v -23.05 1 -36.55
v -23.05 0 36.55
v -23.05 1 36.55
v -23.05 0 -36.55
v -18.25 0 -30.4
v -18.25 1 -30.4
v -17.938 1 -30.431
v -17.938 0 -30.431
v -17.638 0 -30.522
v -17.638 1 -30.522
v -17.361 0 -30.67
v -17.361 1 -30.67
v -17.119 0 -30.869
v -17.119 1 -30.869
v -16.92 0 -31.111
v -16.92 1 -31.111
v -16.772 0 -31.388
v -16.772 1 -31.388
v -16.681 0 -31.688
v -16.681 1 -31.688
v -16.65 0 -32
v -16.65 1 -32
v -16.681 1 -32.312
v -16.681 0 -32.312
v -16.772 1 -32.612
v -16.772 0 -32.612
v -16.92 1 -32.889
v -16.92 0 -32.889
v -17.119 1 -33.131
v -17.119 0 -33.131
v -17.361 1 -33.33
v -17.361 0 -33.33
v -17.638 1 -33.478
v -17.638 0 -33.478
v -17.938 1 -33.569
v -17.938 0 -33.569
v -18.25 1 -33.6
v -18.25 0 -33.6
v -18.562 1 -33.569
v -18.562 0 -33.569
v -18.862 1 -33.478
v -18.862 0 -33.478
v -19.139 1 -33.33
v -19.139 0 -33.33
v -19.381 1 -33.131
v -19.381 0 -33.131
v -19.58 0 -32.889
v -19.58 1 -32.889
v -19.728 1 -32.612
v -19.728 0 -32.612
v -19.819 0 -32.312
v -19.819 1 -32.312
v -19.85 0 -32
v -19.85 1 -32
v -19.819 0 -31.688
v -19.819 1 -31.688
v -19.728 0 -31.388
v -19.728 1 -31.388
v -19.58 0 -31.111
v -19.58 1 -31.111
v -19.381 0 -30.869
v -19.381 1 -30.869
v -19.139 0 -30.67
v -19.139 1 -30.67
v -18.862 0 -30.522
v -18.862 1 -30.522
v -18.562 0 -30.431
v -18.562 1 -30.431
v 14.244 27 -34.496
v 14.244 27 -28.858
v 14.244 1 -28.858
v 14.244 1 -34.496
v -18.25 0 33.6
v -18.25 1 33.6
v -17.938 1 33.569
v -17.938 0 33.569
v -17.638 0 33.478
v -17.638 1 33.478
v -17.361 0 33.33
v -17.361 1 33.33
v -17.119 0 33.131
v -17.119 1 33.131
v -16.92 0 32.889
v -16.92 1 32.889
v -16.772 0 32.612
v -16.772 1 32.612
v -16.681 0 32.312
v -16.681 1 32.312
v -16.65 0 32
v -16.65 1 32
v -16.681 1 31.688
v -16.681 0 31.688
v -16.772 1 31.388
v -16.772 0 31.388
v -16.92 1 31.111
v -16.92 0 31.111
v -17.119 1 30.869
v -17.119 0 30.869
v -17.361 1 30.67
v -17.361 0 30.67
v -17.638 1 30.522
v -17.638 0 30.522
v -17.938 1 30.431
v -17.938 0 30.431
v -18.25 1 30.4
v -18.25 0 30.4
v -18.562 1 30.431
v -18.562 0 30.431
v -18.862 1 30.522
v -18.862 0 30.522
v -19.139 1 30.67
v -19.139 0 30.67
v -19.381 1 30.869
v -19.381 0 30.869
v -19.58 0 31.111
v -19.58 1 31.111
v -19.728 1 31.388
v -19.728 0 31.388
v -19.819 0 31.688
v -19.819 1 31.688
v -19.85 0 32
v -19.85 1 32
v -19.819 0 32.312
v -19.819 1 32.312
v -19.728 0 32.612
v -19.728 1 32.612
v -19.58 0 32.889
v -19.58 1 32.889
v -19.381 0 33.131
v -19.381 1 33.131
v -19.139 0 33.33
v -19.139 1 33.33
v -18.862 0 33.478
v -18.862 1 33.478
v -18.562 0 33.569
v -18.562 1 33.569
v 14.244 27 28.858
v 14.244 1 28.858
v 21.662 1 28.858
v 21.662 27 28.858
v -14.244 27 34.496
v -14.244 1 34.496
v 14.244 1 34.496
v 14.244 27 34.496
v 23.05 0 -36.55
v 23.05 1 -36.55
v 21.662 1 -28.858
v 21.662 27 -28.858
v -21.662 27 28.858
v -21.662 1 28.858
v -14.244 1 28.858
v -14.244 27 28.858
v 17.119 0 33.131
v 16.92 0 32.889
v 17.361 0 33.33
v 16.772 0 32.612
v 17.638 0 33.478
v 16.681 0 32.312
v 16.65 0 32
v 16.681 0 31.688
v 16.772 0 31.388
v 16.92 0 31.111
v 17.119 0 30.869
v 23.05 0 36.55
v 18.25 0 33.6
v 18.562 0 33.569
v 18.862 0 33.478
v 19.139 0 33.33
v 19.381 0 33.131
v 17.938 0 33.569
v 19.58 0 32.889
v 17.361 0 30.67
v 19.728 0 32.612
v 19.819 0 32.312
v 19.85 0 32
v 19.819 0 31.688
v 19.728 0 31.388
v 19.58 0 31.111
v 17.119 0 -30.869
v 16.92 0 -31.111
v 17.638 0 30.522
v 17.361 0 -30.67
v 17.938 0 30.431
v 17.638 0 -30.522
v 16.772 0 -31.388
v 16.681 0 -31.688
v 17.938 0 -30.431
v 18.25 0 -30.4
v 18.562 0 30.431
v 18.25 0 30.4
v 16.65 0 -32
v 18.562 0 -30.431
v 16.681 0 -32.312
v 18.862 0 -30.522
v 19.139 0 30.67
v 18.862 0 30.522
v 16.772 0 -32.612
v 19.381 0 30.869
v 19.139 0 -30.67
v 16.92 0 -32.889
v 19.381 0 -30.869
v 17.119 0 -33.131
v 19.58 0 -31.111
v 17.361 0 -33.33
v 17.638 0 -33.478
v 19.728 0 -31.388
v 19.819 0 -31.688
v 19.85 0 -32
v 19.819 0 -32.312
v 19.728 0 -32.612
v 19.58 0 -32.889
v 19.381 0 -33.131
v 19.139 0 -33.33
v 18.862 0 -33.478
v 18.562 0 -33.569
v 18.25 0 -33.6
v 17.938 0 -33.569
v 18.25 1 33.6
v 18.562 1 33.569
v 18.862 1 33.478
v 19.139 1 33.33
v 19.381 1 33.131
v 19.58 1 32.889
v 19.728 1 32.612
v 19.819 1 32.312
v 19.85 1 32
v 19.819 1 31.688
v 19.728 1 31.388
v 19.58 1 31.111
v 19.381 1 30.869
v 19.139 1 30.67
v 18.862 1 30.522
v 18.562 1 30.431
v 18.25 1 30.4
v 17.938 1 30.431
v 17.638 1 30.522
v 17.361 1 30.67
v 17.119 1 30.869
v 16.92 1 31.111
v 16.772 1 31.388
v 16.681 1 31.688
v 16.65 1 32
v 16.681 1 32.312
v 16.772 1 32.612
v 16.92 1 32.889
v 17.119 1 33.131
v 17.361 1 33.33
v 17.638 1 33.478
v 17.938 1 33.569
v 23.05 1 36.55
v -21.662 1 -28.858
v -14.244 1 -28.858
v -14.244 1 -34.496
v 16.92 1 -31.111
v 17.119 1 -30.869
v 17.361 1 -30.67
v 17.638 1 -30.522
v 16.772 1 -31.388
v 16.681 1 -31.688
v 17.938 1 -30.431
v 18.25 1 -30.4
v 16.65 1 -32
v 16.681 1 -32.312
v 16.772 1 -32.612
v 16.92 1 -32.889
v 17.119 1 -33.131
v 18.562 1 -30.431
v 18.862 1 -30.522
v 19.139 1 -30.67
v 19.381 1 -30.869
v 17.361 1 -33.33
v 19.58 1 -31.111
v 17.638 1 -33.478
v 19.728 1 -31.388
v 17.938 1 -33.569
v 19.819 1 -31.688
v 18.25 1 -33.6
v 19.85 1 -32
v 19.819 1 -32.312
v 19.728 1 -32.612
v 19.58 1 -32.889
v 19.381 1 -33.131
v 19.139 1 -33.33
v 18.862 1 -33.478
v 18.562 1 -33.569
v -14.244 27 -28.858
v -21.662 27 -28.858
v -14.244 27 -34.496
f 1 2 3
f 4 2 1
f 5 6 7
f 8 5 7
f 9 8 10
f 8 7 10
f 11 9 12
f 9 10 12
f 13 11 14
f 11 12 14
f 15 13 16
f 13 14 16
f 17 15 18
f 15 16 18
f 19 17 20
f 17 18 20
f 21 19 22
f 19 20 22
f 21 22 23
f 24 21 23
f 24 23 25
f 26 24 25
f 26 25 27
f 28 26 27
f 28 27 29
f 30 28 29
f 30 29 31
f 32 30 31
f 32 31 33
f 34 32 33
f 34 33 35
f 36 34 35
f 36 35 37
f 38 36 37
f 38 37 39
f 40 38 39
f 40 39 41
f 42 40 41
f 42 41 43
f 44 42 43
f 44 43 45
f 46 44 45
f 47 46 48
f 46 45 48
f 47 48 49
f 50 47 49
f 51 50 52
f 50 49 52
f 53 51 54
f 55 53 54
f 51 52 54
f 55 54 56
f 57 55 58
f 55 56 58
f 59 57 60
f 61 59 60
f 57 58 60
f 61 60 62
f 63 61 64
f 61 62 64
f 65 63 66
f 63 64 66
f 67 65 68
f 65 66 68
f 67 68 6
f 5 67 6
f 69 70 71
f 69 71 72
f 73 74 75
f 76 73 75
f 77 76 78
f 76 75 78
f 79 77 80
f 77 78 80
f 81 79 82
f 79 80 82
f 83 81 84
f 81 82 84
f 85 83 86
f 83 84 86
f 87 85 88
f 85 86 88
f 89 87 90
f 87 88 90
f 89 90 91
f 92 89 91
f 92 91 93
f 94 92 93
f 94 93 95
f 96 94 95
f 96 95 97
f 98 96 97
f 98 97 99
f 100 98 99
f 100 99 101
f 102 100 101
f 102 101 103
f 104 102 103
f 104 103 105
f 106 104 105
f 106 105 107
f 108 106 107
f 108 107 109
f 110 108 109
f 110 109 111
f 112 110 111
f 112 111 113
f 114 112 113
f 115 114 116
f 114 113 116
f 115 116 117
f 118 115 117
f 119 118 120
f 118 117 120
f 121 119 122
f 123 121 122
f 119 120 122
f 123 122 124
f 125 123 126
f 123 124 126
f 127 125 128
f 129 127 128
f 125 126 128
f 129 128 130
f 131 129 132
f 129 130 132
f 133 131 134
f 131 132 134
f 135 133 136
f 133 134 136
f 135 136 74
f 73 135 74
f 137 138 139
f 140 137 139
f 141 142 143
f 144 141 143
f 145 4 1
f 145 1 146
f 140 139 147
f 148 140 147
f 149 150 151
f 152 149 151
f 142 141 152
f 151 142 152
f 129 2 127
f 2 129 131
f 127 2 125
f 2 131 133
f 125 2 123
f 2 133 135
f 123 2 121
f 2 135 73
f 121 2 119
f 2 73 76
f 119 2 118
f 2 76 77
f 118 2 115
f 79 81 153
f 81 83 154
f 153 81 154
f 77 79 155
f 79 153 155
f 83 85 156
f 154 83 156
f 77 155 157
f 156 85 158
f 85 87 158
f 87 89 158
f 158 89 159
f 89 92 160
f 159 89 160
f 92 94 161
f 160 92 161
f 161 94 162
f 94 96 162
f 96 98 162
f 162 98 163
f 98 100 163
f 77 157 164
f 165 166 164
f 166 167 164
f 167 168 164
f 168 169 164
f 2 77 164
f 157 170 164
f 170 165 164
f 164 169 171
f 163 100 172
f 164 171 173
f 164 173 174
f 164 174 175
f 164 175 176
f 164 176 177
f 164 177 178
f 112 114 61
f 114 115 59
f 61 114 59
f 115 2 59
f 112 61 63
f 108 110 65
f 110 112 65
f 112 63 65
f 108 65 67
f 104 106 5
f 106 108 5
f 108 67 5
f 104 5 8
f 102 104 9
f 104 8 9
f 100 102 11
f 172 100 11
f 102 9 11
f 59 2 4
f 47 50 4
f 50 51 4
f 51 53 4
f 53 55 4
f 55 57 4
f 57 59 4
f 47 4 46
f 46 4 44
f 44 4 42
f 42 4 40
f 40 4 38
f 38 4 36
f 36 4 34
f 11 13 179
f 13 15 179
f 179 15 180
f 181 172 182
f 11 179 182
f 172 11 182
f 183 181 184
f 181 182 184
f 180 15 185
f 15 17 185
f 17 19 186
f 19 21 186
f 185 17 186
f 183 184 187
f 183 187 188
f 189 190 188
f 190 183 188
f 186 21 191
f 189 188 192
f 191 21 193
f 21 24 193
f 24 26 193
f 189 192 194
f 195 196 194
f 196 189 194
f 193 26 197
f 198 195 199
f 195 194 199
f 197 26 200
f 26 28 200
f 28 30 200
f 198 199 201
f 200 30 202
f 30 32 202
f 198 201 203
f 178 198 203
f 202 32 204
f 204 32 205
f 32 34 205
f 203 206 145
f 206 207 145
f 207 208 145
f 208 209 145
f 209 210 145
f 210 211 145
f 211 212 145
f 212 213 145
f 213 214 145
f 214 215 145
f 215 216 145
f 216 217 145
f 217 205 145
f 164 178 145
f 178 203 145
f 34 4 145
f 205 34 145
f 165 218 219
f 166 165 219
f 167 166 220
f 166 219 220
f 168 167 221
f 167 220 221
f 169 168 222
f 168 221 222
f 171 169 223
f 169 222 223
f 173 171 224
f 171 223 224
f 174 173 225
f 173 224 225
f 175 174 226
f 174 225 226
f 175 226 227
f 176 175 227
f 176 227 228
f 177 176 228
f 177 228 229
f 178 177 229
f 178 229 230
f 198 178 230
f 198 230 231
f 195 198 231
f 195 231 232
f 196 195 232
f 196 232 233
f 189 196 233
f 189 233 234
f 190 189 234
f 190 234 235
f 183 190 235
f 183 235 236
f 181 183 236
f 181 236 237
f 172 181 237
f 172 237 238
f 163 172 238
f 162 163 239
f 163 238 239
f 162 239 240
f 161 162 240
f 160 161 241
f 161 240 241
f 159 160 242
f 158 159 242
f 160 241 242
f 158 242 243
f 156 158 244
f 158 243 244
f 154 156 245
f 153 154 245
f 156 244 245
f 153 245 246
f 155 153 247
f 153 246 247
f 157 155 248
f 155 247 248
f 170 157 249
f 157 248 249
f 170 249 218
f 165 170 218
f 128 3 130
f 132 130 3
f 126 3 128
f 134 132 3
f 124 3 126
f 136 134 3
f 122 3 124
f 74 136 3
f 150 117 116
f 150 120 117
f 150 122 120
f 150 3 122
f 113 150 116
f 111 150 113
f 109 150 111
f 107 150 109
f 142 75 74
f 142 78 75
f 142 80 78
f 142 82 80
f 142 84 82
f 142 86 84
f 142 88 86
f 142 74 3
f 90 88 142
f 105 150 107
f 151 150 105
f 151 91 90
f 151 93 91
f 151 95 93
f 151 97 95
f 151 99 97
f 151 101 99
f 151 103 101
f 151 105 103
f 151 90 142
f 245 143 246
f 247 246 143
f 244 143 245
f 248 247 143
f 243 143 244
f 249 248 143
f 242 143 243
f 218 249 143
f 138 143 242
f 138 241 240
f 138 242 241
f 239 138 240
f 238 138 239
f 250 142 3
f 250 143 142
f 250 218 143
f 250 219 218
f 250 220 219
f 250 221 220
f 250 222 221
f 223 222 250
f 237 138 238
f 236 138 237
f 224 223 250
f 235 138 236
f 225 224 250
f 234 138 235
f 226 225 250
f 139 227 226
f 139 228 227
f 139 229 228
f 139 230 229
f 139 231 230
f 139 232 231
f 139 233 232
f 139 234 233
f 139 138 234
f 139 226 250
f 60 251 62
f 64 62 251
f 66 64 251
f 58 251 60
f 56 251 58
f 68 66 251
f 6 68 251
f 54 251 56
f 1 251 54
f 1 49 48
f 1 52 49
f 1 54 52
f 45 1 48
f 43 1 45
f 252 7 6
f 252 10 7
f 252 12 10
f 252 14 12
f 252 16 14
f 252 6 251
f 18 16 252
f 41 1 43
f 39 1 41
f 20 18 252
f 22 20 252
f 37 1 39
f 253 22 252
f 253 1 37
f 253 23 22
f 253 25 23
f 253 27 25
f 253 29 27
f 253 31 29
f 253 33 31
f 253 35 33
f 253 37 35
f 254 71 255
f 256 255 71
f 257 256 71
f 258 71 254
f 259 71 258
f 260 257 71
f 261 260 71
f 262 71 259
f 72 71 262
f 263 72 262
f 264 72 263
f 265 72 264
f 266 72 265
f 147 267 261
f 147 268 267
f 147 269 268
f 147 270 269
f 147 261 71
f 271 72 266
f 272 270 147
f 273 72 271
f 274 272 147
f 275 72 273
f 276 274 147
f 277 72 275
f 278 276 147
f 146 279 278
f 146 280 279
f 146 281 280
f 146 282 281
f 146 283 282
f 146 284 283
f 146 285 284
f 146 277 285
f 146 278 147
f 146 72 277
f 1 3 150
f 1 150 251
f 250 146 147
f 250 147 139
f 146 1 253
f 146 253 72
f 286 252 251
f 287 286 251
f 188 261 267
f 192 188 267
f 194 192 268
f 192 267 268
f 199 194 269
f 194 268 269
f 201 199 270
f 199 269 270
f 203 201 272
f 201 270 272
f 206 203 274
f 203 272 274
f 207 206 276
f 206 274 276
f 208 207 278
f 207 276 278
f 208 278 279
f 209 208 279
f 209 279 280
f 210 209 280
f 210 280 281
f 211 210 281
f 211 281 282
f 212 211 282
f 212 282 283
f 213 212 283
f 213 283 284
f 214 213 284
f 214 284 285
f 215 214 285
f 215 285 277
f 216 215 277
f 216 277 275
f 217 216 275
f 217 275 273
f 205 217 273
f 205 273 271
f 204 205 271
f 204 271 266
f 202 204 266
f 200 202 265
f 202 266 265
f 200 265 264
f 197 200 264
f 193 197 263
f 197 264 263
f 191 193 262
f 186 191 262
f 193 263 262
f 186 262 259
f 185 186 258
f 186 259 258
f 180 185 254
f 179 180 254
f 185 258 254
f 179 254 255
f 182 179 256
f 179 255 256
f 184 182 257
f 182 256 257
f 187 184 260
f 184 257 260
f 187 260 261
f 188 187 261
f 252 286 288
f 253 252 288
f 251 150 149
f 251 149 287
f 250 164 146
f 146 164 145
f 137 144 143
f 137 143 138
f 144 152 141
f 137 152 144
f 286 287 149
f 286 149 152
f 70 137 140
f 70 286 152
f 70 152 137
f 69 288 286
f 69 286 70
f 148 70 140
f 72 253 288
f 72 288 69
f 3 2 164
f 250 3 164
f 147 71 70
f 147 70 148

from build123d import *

# Parameters (mm, degrees)
SKETCH1_W           = 46.1
SKETCH1_H           = 73.1
BOSS_EXTRUDE1_DEPTH = 1
SKETCH3_R           = 1.6
CUT_EXTRUDE1_DEPTH  = 44.222737072
SKETCH2_W           = 7.418491492
SKETCH2_H           = 57.715863808
SKETCH2_W_2         = 28.48700733
SKETCH2_H_2         = 5.638053534
BOSS_EXTRUDE2_DEPTH = 26


with BuildPart() as part:
    # Sketch1 → Boss-Extrude1 (new body)
    with BuildSketch(Plane(origin=(0, 0, 0), x_dir=(1, 0, 0), z_dir=(0, 1, 0))):
        Rectangle(SKETCH1_W, SKETCH1_H)
    extrude(amount=BOSS_EXTRUDE1_DEPTH)

    # Sketch3 → Cut-Extrude1 (cut, through all)
    with BuildSketch(Plane(origin=(0, 1, 0), x_dir=(1, 0, 0), z_dir=(0, 1, 0))):
        with Locations(Location((-18.25, 32, 0), (0, 0, 270))):
            Circle(SKETCH3_R)
        with Locations(Location((18.25, 32, 0), (0, 0, 270))):
            Circle(SKETCH3_R)
        with Locations(Location((18.25, -32, 0), (0, 0, 270))):
            Circle(SKETCH3_R)
        with Locations(Location((-18.25, -32, 0), (0, 0, 270))):
            Circle(SKETCH3_R)
    extrude(amount=-CUT_EXTRUDE1_DEPTH, mode=Mode.SUBTRACT)

    # Sketch2 → Boss-Extrude2 (add)
    with BuildSketch(Plane(origin=(0, 1, 0), x_dir=(1, 0, 0), z_dir=(0, 1, 0))):
        with Locations((-17.952749411, 0)):
            Rectangle(SKETCH2_W, SKETCH2_H)
        Rectangle(SKETCH2_W_2, SKETCH2_H)
        with Locations((0, 31.676958671)):
            Rectangle(SKETCH2_W_2, SKETCH2_H_2)
        with Locations((17.952749411, 0)):
            Rectangle(SKETCH2_W, SKETCH2_H)
        with Locations((0, -31.676958671)):
            Rectangle(SKETCH2_W_2, SKETCH2_H_2)
    extrude(amount=BOSS_EXTRUDE2_DEPTH)


solid = part.part
